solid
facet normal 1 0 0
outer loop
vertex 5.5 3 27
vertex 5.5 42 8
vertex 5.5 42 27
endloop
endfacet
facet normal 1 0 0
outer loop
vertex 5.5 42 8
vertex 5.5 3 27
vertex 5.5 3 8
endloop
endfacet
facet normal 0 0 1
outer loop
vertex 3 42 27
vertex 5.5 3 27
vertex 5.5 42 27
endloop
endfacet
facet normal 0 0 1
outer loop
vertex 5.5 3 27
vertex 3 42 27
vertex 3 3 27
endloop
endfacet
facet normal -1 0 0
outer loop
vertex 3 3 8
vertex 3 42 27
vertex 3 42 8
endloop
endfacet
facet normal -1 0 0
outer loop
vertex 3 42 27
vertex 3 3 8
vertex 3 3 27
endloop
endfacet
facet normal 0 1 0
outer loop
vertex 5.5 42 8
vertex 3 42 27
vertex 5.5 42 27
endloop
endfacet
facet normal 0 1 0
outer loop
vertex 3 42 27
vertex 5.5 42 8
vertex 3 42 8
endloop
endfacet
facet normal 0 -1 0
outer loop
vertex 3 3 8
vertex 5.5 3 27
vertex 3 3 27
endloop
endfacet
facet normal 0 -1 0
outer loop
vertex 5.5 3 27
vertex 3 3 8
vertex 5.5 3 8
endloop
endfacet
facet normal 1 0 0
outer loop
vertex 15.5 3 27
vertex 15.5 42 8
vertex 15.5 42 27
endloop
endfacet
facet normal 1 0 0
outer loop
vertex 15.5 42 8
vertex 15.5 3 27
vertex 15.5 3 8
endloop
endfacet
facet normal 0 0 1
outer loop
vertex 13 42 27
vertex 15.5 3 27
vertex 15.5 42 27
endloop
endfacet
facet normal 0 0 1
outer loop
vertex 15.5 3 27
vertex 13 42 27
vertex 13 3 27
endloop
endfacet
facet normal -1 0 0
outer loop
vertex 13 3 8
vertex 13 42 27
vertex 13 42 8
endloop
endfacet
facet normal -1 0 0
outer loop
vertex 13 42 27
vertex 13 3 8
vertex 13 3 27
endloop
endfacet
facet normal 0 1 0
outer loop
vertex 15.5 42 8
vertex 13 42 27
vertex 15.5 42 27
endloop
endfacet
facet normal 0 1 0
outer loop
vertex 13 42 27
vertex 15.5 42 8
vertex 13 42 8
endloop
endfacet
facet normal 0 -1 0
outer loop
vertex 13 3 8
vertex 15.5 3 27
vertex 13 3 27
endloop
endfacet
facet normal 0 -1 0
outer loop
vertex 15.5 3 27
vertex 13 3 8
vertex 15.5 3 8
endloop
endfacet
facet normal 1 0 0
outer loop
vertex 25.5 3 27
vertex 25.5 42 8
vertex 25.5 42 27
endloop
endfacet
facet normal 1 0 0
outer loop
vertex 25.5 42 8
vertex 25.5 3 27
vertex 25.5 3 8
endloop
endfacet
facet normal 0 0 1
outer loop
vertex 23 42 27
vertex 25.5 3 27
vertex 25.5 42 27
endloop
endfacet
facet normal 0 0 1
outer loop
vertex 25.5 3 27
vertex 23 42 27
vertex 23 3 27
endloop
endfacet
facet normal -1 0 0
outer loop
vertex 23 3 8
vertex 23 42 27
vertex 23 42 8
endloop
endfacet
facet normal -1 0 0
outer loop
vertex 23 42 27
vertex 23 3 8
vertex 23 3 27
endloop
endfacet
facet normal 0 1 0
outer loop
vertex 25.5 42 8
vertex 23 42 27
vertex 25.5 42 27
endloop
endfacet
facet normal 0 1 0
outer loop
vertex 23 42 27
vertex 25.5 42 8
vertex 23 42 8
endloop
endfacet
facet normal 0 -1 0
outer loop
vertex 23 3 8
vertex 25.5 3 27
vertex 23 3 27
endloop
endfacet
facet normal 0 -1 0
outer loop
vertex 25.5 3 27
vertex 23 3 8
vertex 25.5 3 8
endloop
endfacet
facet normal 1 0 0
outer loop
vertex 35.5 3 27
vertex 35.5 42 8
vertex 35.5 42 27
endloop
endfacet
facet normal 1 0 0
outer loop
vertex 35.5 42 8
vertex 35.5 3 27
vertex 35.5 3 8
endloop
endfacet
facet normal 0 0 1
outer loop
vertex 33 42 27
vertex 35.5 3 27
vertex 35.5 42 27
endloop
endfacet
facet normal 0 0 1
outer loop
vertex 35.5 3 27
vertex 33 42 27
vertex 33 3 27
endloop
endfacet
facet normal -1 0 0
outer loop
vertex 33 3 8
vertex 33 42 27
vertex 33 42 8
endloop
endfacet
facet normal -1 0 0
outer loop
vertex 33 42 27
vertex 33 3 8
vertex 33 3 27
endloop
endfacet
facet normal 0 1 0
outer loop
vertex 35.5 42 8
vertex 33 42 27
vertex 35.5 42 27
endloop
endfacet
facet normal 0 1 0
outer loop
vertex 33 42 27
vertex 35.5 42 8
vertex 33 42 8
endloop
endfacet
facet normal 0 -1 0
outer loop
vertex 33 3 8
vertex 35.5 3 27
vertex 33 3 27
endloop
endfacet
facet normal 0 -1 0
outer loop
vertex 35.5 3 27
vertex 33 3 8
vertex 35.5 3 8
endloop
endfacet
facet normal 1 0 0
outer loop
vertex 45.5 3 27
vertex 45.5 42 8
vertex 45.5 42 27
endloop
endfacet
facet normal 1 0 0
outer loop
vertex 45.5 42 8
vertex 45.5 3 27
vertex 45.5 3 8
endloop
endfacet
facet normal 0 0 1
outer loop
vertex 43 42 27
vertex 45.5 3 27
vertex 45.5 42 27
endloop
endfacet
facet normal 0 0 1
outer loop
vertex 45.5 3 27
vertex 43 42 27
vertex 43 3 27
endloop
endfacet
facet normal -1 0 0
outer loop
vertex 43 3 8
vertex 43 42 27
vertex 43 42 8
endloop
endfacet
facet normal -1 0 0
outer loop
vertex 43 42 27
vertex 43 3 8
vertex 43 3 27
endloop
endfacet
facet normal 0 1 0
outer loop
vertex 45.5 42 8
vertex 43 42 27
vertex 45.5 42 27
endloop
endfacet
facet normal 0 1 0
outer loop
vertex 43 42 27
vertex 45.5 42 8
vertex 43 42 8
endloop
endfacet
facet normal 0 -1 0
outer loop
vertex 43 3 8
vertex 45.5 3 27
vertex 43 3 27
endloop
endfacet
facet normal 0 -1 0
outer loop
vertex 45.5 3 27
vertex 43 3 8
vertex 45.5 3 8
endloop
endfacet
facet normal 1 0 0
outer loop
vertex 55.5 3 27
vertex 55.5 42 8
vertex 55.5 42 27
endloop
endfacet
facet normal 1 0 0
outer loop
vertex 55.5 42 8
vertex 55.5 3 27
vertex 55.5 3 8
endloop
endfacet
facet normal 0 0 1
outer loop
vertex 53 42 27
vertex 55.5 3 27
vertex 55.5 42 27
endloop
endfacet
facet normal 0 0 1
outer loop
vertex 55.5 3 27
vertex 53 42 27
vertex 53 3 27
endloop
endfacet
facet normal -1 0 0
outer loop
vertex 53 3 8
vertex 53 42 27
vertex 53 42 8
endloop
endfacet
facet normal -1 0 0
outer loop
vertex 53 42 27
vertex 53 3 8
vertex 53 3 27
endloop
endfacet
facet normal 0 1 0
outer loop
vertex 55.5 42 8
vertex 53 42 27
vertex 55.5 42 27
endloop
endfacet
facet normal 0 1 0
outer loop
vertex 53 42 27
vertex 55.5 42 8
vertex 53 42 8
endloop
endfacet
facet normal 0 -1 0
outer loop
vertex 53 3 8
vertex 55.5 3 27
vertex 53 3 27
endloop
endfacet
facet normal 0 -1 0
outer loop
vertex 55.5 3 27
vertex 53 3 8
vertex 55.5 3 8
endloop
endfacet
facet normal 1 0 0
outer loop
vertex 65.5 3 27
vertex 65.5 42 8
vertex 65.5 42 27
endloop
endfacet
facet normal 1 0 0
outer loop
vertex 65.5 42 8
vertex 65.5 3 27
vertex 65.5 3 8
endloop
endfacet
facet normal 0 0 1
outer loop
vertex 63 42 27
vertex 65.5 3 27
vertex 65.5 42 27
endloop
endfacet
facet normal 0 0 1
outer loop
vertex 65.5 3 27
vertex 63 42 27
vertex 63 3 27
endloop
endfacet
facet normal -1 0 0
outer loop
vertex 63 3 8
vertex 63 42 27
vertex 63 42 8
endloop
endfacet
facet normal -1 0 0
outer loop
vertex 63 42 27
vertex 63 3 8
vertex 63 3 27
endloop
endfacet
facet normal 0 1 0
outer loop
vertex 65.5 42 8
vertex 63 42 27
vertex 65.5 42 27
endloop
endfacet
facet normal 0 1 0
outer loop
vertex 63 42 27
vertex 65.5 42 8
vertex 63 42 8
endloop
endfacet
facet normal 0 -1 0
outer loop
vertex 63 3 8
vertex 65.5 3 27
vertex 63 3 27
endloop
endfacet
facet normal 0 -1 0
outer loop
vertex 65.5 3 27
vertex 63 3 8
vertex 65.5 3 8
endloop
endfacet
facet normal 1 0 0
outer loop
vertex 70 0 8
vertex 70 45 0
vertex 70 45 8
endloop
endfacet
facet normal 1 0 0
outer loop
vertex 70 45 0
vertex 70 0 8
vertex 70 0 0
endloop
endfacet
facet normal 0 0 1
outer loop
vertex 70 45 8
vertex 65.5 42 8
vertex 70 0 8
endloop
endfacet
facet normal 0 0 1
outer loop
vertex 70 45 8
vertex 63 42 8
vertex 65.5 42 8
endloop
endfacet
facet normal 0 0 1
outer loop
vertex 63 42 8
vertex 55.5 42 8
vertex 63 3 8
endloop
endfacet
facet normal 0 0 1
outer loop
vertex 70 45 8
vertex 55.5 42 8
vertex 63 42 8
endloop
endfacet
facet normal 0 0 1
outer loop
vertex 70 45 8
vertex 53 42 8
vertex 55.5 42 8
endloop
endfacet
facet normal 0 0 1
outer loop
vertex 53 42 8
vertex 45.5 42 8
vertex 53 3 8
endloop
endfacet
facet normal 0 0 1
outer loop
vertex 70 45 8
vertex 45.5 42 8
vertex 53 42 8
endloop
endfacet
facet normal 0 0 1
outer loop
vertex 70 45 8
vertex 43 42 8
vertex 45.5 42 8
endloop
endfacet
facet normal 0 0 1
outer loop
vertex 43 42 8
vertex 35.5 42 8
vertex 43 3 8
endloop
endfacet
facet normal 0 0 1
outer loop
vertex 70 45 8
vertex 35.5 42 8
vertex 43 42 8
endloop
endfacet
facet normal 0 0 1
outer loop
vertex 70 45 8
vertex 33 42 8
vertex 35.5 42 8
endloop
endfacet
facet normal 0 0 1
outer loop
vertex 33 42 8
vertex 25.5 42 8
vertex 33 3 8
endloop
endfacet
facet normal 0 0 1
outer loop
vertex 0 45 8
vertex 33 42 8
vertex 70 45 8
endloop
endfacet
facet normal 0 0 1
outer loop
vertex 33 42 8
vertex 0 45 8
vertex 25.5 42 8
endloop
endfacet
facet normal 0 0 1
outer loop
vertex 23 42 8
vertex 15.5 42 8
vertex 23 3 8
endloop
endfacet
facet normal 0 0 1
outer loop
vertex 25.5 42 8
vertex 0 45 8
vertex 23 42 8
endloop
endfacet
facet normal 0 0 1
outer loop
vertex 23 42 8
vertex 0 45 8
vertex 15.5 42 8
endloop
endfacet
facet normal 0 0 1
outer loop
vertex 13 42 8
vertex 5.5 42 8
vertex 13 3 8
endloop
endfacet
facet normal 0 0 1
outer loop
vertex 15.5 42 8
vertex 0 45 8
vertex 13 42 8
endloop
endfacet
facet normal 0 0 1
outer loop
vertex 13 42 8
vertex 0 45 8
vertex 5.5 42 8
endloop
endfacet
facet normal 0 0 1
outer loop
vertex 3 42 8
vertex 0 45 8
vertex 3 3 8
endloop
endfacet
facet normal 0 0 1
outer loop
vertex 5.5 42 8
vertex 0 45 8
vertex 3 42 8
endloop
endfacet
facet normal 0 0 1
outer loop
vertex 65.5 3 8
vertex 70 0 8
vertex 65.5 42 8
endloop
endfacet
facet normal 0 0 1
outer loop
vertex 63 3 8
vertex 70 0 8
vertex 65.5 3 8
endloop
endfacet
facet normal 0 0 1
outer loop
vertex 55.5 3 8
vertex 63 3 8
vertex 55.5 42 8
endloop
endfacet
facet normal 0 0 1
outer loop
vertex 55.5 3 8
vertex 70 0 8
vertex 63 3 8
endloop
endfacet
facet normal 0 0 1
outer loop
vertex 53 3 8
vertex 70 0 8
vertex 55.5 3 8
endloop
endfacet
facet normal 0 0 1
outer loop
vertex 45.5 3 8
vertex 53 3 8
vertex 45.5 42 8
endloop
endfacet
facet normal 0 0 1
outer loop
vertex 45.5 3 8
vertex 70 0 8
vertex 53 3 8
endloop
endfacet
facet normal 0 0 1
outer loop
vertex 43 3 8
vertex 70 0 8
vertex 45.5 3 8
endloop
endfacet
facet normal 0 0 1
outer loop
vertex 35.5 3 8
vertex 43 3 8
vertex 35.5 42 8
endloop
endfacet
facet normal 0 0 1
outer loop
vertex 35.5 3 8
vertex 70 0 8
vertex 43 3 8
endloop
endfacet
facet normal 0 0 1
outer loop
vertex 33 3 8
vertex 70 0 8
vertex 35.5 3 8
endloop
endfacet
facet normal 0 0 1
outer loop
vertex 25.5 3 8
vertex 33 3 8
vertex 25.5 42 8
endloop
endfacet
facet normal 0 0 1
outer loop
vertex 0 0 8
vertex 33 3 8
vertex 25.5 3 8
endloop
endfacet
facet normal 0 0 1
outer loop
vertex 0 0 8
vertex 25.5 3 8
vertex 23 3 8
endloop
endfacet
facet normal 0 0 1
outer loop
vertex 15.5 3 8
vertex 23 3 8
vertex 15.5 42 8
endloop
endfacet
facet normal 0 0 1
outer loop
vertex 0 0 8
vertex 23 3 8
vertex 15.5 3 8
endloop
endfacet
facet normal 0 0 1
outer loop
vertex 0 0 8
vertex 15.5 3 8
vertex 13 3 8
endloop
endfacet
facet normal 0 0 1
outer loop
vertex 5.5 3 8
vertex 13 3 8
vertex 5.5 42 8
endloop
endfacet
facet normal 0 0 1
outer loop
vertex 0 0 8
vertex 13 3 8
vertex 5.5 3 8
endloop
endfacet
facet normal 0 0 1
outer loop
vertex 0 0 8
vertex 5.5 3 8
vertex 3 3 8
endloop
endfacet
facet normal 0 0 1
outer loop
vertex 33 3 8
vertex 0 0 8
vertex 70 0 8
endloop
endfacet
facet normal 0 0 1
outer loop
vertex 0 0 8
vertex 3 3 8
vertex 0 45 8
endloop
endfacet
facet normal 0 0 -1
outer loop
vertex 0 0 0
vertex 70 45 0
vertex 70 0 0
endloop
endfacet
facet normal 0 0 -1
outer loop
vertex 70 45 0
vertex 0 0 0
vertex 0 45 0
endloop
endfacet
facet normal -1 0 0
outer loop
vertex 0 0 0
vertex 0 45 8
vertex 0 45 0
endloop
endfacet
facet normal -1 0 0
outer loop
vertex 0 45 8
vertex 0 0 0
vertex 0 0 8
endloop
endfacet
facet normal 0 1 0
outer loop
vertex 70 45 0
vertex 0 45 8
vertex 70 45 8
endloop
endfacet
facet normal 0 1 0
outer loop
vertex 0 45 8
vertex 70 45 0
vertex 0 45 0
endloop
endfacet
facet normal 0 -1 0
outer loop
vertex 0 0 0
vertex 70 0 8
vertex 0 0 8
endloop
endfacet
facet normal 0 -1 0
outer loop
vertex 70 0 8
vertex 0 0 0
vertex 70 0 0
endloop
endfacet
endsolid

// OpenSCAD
$fn = 32;

// ----------------------------------------------------------------------
// Heatsink: uniform fin block
// ----------------------------------------------------------------------

// --- parameters (mm) ---
base_l = 70;              // base length, X
base_w = 45;              // base width, Y
base_t = 8;               // base plate thickness
fin_h = 20;               // fin height above the base
fin_t = 2.5;              // fin thickness
edge = 3;                 // margin from the base ends
pitch = 10;               // fin pitch

n_fins = floor((base_l - 2 * edge - fin_t) / pitch) + 1;  // fin count
total_h = base_t + fin_h - 1;  // overall height

union() {
  cube([base_l, base_w, base_t]);
  for (i = [0 : n_fins - 1])
    translate([edge + i * pitch, edge, base_t - 1])
      cube([fin_t, base_w - 2 * edge, fin_h]);
}
